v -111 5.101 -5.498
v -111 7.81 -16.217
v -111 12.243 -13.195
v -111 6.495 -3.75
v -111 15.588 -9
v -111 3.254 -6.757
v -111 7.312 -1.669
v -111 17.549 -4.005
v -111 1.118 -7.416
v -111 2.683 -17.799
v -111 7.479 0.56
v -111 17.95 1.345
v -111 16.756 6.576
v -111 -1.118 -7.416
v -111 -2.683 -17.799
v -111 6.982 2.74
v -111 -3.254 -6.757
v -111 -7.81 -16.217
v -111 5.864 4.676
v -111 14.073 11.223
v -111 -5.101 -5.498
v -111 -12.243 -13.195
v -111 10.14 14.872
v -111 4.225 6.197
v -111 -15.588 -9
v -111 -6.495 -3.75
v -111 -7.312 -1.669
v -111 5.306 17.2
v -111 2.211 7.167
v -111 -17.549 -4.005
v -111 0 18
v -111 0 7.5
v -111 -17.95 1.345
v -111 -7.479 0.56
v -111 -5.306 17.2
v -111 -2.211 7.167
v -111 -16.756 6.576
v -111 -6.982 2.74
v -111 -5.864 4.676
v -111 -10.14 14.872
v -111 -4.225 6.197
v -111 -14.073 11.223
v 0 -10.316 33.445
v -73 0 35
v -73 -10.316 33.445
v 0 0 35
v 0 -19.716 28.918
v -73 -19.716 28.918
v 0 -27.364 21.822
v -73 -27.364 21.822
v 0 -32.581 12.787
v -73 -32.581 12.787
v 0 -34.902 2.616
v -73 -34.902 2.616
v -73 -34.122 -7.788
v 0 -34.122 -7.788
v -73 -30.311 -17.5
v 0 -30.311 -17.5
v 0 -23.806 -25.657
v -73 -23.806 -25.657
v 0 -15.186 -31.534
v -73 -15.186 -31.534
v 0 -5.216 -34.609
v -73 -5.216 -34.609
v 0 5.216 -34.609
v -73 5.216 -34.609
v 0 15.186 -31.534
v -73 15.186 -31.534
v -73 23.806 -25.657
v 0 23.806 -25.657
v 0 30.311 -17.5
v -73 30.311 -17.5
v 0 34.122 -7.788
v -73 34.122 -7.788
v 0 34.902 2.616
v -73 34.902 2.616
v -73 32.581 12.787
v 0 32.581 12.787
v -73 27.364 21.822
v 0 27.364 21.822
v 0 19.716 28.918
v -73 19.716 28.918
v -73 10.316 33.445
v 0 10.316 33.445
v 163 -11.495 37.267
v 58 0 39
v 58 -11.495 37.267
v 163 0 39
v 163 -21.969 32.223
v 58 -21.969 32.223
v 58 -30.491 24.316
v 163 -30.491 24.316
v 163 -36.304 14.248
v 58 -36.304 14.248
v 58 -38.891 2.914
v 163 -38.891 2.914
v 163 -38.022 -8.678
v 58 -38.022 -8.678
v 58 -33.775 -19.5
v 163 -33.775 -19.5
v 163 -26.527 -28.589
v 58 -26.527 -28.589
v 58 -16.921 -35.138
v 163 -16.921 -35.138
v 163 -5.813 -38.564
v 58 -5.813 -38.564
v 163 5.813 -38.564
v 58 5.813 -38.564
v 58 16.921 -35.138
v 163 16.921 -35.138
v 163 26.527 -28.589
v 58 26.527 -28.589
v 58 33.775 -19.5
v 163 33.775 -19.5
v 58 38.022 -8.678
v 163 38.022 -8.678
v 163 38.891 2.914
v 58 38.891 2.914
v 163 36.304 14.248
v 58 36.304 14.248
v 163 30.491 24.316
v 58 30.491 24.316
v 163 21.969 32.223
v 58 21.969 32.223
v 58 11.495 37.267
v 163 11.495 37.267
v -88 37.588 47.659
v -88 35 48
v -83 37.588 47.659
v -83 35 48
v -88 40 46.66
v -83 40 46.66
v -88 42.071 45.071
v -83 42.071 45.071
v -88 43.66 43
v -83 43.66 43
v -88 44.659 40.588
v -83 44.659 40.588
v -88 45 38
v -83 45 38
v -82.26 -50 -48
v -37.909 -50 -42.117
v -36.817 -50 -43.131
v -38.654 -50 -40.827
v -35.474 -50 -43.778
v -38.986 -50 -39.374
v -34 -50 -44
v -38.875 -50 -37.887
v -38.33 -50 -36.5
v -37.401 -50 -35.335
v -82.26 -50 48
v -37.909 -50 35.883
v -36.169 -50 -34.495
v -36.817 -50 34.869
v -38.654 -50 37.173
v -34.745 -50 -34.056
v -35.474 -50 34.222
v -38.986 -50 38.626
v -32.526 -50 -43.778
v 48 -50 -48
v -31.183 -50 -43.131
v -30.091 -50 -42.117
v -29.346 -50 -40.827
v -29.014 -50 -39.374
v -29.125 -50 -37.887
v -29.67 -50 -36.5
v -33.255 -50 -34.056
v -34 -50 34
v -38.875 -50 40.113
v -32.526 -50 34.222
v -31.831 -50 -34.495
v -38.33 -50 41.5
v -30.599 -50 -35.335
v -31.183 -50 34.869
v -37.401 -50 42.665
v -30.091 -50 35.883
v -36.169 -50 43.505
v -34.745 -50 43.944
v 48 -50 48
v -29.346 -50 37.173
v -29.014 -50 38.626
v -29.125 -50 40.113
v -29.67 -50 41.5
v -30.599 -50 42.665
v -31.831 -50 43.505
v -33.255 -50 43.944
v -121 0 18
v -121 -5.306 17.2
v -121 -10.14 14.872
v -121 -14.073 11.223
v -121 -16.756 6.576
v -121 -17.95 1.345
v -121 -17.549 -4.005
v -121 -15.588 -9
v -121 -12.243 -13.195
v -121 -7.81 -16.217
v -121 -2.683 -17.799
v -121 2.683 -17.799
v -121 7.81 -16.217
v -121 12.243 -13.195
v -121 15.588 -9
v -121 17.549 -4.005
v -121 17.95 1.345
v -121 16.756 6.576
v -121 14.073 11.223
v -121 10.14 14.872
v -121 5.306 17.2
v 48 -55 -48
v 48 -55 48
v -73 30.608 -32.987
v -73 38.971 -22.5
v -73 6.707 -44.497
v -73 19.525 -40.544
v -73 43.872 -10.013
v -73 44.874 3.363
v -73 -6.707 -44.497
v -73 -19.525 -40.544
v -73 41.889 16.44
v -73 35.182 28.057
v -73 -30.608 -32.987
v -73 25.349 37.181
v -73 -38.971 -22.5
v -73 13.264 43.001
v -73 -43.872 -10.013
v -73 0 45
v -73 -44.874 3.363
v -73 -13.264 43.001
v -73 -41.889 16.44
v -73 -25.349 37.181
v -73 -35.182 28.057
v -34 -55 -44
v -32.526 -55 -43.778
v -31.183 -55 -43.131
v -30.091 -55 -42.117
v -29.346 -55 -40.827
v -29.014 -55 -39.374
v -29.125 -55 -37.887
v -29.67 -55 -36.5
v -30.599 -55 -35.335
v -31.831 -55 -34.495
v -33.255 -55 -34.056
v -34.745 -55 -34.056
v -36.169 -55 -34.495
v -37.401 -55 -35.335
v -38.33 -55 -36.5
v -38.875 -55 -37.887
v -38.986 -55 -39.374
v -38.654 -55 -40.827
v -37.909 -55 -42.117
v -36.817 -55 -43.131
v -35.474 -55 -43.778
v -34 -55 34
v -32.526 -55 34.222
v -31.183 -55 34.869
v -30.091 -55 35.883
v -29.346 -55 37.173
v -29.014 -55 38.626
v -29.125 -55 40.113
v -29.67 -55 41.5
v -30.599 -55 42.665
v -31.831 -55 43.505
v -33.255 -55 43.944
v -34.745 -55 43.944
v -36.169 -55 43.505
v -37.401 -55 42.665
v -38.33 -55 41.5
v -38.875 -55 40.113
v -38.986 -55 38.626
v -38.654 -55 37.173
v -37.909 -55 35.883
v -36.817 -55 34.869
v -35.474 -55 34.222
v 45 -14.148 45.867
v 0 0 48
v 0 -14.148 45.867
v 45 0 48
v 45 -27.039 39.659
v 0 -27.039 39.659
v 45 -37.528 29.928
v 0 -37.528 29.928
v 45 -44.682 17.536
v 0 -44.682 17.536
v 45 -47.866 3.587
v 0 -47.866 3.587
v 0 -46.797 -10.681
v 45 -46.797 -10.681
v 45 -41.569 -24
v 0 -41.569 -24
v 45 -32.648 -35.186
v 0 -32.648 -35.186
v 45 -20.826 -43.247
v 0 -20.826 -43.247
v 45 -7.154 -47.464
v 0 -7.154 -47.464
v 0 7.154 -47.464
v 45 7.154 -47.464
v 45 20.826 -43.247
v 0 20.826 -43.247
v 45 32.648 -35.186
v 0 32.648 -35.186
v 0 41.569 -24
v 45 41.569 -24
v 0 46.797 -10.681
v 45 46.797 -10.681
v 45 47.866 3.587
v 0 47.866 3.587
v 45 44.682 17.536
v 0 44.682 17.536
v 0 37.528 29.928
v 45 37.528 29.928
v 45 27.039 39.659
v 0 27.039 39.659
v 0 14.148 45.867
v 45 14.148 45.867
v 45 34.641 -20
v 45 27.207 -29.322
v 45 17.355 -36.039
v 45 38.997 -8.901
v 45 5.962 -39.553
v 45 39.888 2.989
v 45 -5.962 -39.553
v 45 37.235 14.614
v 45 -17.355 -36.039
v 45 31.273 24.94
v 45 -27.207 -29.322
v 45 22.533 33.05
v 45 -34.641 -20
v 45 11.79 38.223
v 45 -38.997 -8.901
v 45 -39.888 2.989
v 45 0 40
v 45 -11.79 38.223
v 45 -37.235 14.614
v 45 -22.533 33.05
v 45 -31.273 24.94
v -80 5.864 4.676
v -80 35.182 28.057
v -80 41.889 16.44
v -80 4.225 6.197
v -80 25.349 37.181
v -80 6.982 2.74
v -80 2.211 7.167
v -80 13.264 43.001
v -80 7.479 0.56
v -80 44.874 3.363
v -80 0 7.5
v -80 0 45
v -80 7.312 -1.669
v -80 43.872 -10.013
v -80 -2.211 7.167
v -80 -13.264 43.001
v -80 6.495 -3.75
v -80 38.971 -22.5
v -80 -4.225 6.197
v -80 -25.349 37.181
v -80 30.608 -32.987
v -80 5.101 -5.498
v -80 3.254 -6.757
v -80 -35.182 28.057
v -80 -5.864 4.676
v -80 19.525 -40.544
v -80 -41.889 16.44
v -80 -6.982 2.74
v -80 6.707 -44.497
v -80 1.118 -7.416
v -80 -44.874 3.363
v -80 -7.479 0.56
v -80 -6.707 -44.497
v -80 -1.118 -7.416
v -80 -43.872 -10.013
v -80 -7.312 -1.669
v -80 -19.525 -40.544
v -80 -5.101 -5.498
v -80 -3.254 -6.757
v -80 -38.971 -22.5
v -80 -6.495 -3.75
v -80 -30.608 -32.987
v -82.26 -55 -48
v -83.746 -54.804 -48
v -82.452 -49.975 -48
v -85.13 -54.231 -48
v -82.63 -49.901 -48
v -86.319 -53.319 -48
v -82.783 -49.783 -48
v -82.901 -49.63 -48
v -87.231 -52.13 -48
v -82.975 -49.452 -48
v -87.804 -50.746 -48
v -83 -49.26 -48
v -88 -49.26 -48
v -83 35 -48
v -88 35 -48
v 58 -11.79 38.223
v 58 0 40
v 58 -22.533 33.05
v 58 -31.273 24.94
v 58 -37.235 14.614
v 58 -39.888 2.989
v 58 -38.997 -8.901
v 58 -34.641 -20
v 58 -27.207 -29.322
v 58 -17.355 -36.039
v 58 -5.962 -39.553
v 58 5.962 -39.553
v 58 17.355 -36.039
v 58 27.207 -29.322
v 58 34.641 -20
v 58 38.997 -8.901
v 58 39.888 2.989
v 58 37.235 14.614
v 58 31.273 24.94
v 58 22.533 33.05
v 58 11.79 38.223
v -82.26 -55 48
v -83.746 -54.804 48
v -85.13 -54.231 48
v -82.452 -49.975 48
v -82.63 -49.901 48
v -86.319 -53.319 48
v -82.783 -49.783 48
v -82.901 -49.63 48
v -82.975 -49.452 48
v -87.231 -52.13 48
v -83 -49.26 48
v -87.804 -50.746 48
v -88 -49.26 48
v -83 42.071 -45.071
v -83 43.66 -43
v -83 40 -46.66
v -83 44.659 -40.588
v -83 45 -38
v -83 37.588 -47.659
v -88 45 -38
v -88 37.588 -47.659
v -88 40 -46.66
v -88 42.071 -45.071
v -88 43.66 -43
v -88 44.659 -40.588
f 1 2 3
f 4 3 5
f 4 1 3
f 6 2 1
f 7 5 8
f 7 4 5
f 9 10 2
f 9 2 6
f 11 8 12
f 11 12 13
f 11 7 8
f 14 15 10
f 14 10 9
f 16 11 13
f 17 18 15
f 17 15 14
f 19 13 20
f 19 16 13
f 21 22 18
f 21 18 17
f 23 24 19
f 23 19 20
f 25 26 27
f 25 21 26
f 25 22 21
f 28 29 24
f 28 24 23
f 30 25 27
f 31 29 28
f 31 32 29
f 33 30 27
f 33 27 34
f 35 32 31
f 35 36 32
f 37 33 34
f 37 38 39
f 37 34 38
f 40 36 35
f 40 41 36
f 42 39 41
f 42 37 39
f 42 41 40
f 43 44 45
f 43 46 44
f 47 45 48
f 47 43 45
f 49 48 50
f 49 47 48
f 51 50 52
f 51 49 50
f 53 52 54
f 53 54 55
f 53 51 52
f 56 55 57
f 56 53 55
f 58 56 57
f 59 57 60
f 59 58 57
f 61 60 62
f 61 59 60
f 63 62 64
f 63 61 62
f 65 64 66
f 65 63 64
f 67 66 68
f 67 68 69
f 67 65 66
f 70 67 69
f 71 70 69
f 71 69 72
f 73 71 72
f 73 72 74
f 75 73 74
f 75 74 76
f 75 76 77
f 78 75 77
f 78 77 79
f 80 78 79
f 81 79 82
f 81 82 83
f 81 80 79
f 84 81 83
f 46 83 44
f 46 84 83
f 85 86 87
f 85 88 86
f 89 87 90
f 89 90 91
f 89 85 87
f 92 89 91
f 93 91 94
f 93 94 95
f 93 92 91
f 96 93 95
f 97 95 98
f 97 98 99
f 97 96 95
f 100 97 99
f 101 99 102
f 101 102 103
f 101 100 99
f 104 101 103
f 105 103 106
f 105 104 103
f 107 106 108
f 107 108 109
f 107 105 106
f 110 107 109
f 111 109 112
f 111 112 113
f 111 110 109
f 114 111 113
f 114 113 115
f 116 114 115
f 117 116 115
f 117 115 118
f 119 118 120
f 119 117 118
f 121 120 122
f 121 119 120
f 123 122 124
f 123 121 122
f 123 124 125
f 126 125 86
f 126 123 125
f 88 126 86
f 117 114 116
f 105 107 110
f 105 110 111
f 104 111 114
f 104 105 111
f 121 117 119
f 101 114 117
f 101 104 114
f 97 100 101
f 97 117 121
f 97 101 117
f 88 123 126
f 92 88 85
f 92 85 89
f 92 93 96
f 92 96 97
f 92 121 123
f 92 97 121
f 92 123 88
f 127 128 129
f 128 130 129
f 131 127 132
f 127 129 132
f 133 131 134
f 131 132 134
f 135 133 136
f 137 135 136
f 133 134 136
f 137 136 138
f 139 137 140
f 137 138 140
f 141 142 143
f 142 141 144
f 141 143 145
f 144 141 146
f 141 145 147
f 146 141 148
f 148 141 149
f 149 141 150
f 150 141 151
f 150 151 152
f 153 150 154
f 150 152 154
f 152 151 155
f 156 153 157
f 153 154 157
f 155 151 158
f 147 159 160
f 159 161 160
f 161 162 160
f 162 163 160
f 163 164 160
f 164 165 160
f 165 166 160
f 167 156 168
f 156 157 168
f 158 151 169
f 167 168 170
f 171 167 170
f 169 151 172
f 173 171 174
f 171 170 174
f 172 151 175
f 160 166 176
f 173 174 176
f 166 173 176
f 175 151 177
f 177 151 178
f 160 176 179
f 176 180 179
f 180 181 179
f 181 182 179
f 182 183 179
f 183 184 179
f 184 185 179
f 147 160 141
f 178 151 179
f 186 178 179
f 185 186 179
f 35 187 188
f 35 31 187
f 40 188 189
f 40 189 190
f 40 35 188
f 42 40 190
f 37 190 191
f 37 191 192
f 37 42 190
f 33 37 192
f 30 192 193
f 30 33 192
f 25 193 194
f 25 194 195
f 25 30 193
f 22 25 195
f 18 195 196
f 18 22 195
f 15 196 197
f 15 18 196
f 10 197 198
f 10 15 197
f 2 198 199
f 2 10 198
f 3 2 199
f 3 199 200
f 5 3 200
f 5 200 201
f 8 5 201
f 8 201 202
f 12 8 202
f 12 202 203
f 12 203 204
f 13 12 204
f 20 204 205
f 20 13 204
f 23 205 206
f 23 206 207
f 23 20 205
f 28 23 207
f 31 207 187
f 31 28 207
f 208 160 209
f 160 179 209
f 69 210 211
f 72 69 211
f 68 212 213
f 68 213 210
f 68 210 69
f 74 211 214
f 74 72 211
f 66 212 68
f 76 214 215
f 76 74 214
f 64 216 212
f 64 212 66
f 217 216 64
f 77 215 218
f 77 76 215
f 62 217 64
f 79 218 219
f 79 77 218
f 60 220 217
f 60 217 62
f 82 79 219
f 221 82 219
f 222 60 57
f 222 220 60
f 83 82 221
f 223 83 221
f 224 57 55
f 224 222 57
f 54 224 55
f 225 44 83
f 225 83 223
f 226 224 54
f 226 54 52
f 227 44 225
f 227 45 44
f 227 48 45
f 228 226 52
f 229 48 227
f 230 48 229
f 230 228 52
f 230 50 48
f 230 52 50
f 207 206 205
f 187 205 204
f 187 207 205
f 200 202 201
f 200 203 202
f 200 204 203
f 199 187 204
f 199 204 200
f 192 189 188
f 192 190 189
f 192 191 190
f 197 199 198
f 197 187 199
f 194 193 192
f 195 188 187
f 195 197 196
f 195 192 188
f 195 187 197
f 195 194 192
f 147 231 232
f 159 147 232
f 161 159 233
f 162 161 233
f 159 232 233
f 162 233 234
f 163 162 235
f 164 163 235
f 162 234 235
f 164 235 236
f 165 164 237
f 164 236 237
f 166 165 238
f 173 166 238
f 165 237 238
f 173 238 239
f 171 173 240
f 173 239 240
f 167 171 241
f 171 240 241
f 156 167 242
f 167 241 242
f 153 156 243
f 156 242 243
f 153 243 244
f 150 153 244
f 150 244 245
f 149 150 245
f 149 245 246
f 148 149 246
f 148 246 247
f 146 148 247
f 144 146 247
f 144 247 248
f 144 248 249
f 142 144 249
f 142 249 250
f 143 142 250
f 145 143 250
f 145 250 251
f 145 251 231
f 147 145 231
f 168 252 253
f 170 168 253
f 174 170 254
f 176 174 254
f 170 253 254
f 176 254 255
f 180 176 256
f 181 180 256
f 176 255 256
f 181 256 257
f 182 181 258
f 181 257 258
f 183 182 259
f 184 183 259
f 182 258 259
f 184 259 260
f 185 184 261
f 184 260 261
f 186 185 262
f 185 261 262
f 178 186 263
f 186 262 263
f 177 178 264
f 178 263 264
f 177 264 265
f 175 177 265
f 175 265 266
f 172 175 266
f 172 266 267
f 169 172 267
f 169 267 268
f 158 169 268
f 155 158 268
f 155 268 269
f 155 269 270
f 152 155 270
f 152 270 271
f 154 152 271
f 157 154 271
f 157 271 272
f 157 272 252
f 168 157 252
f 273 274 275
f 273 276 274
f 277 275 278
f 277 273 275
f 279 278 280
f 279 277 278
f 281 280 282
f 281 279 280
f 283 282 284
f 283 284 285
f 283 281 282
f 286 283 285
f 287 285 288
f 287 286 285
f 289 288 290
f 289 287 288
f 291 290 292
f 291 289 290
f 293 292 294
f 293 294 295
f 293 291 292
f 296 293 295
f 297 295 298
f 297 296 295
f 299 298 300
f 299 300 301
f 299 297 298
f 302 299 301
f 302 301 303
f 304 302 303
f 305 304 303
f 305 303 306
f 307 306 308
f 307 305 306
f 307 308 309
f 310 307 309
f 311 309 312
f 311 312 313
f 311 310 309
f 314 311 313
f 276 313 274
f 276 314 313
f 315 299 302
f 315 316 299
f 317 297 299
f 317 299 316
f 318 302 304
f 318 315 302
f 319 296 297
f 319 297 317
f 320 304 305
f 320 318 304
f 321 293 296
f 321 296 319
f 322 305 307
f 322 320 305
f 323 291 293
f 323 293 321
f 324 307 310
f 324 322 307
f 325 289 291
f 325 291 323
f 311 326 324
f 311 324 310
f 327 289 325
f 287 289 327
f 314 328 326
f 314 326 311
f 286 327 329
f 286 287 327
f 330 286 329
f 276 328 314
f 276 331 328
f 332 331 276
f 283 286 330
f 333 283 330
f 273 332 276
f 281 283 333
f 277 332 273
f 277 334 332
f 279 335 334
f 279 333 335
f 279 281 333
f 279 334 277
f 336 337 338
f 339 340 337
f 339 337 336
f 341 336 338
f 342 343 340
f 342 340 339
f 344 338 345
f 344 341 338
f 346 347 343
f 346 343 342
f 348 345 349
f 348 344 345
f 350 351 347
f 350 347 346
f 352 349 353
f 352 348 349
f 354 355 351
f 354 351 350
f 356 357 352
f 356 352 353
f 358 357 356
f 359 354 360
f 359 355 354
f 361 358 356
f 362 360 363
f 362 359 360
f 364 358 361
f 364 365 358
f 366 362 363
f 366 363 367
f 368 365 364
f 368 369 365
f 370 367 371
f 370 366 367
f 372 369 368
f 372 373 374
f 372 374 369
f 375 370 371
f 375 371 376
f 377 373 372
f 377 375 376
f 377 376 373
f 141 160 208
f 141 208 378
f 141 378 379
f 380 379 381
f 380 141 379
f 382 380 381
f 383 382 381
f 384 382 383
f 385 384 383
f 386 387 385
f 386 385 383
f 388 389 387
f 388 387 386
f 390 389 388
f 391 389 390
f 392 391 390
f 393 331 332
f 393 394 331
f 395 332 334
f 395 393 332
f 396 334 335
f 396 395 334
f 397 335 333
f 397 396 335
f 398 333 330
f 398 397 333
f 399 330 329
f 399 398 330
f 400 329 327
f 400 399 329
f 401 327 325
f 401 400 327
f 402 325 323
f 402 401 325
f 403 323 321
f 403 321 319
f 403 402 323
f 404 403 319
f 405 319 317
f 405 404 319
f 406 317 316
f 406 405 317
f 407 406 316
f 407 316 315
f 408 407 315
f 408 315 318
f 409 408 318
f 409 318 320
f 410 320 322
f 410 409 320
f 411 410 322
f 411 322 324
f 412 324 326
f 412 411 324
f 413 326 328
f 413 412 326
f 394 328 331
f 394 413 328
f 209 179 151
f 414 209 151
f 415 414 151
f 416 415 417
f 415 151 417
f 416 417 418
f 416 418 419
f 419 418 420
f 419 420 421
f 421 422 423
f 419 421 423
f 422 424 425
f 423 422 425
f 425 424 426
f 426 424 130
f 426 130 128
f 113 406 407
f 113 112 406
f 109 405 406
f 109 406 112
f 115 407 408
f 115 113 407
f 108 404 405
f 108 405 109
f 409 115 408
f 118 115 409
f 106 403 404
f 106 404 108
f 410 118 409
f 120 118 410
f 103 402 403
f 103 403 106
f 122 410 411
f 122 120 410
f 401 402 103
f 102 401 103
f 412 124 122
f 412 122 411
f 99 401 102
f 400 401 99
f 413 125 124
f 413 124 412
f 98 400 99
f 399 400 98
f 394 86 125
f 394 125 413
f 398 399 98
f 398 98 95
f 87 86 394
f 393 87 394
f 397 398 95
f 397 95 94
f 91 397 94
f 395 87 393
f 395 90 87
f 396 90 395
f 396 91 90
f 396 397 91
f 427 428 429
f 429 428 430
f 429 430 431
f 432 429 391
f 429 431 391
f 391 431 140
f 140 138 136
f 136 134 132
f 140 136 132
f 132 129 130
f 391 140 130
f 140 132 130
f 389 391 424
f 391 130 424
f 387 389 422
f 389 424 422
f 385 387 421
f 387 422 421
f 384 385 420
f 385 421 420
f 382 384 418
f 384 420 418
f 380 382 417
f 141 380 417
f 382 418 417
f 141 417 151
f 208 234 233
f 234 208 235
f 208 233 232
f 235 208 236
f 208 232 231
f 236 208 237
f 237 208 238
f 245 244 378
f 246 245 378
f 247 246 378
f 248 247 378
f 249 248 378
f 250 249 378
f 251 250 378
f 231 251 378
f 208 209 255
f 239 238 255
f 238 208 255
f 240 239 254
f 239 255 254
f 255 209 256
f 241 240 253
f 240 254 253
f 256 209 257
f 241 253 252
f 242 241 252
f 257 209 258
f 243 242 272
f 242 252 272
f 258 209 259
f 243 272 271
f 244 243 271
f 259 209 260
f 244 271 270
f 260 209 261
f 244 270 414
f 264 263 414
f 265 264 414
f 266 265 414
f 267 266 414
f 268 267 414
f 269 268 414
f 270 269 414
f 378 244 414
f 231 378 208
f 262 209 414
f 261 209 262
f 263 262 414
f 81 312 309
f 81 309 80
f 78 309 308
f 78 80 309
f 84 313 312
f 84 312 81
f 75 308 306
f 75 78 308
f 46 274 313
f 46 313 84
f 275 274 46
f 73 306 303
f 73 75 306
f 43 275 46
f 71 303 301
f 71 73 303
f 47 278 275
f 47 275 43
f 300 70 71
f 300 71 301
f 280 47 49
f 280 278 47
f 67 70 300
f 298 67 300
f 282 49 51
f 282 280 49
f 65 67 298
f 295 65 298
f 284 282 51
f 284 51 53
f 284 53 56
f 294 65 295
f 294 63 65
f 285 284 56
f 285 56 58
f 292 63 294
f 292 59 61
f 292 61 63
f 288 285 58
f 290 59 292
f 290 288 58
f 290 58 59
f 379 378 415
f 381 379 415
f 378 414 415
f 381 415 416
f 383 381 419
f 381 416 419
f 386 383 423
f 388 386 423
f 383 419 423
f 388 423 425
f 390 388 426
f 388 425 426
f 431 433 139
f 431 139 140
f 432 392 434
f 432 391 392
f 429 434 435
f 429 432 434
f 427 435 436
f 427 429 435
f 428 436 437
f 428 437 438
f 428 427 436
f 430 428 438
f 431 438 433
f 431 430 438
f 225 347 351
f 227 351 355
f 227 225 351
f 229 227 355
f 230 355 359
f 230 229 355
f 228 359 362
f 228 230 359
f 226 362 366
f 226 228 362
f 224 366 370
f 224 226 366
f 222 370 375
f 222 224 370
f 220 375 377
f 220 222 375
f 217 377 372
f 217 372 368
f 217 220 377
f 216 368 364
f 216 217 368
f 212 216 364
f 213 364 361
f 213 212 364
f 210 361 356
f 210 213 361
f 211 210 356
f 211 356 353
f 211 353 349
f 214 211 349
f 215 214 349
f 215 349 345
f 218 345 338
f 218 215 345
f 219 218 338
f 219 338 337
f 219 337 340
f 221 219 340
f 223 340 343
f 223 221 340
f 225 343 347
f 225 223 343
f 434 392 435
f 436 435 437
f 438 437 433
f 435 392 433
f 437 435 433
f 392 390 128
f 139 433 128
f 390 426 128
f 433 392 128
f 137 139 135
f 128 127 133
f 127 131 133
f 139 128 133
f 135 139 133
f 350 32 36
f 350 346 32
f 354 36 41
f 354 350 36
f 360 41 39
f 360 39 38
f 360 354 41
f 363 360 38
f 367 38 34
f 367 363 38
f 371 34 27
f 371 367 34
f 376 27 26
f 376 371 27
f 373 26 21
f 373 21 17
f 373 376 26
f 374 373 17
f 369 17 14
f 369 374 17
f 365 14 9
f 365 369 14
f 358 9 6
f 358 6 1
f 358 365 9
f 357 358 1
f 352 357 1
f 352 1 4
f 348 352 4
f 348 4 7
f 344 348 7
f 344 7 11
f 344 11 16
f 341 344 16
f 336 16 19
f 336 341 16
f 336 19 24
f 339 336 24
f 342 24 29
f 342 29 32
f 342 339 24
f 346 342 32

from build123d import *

# Parameters (mm, degrees)
SM_BASE_FLANGE_1_DEPTH = 48
FILLET_1_R             = 10
SKETCH_7_R             = 5
CUT_EXTRUDE_1_DEPTH    = 10


# Sheet-metal steps are written as plain solids
with BuildPart() as part:
    # Sketch 1 → Повернуть1 (revolve)
    with BuildSketch(Plane.XY, mode=Mode.PRIVATE) as revolve_1_sk:
        Polygon((-121, 0), (-121, 18), (-111, 18), (-111, 7.5), (-80, 7.5), (-80, 45), (-73, 45), (-73, 35), (0, 35), (0, 48), (45, 48), (45, 40), (58, 40), (58, 39), (163, 39), (163, 0), align=None)
    revolve(revolve_1_sk.sketch.rotate(Axis((-1759.029233716, 0, 0), (1, 0, 0)), 90), axis=Axis((-1759.029233716, 0, 0), (1, 0, 0)))


with BuildPart() as body_2:
    # Sketch 2 → Базовая кромка1 (new, symmetric)
    with BuildSketch(Plane.XY):
        with BuildLine():
            Line((-83, 45), (-83, -49.26))
            ThreePointArc((-83, -49.26), (-82.783259018, -49.783259018), (-82.26, -50))
            Line((-82.26, -50), (48, -50))
            Line((48, -50), (48, -55))
            Line((48, -55), (-82.26, -55))
            ThreePointArc((-82.26, -55), (-86.318792924, -53.318792924), (-88, -49.26))
            Line((-88, -49.26), (-88, 45))
            Line((-88, 45), (-83, 45))
        make_face()
    extrude(amount=SM_BASE_FLANGE_1_DEPTH, both=True)

    # Скругление1
    fillet_1_edges = [body_2.edges().sort_by_distance(p)[0] for p in [
        (-85.5, 45, 48),
        (-85.5, 45, -48),
    ]]
    fillet(fillet_1_edges, radius=FILLET_1_R)

    # Эскиз7 → Вырез-Вытянуть1 (cut)
    with BuildSketch(Plane.XZ.offset(55)):
        with Locations(Location((-34, 39, 0), (0, 0, 270))):
            Circle(SKETCH_7_R)
        with Locations(Location((-34, -39, 0), (0, 0, 270))):
            Circle(SKETCH_7_R)
    extrude(amount=-CUT_EXTRUDE_1_DEPTH, mode=Mode.SUBTRACT)


solid = Compound([part.part, body_2.part])
